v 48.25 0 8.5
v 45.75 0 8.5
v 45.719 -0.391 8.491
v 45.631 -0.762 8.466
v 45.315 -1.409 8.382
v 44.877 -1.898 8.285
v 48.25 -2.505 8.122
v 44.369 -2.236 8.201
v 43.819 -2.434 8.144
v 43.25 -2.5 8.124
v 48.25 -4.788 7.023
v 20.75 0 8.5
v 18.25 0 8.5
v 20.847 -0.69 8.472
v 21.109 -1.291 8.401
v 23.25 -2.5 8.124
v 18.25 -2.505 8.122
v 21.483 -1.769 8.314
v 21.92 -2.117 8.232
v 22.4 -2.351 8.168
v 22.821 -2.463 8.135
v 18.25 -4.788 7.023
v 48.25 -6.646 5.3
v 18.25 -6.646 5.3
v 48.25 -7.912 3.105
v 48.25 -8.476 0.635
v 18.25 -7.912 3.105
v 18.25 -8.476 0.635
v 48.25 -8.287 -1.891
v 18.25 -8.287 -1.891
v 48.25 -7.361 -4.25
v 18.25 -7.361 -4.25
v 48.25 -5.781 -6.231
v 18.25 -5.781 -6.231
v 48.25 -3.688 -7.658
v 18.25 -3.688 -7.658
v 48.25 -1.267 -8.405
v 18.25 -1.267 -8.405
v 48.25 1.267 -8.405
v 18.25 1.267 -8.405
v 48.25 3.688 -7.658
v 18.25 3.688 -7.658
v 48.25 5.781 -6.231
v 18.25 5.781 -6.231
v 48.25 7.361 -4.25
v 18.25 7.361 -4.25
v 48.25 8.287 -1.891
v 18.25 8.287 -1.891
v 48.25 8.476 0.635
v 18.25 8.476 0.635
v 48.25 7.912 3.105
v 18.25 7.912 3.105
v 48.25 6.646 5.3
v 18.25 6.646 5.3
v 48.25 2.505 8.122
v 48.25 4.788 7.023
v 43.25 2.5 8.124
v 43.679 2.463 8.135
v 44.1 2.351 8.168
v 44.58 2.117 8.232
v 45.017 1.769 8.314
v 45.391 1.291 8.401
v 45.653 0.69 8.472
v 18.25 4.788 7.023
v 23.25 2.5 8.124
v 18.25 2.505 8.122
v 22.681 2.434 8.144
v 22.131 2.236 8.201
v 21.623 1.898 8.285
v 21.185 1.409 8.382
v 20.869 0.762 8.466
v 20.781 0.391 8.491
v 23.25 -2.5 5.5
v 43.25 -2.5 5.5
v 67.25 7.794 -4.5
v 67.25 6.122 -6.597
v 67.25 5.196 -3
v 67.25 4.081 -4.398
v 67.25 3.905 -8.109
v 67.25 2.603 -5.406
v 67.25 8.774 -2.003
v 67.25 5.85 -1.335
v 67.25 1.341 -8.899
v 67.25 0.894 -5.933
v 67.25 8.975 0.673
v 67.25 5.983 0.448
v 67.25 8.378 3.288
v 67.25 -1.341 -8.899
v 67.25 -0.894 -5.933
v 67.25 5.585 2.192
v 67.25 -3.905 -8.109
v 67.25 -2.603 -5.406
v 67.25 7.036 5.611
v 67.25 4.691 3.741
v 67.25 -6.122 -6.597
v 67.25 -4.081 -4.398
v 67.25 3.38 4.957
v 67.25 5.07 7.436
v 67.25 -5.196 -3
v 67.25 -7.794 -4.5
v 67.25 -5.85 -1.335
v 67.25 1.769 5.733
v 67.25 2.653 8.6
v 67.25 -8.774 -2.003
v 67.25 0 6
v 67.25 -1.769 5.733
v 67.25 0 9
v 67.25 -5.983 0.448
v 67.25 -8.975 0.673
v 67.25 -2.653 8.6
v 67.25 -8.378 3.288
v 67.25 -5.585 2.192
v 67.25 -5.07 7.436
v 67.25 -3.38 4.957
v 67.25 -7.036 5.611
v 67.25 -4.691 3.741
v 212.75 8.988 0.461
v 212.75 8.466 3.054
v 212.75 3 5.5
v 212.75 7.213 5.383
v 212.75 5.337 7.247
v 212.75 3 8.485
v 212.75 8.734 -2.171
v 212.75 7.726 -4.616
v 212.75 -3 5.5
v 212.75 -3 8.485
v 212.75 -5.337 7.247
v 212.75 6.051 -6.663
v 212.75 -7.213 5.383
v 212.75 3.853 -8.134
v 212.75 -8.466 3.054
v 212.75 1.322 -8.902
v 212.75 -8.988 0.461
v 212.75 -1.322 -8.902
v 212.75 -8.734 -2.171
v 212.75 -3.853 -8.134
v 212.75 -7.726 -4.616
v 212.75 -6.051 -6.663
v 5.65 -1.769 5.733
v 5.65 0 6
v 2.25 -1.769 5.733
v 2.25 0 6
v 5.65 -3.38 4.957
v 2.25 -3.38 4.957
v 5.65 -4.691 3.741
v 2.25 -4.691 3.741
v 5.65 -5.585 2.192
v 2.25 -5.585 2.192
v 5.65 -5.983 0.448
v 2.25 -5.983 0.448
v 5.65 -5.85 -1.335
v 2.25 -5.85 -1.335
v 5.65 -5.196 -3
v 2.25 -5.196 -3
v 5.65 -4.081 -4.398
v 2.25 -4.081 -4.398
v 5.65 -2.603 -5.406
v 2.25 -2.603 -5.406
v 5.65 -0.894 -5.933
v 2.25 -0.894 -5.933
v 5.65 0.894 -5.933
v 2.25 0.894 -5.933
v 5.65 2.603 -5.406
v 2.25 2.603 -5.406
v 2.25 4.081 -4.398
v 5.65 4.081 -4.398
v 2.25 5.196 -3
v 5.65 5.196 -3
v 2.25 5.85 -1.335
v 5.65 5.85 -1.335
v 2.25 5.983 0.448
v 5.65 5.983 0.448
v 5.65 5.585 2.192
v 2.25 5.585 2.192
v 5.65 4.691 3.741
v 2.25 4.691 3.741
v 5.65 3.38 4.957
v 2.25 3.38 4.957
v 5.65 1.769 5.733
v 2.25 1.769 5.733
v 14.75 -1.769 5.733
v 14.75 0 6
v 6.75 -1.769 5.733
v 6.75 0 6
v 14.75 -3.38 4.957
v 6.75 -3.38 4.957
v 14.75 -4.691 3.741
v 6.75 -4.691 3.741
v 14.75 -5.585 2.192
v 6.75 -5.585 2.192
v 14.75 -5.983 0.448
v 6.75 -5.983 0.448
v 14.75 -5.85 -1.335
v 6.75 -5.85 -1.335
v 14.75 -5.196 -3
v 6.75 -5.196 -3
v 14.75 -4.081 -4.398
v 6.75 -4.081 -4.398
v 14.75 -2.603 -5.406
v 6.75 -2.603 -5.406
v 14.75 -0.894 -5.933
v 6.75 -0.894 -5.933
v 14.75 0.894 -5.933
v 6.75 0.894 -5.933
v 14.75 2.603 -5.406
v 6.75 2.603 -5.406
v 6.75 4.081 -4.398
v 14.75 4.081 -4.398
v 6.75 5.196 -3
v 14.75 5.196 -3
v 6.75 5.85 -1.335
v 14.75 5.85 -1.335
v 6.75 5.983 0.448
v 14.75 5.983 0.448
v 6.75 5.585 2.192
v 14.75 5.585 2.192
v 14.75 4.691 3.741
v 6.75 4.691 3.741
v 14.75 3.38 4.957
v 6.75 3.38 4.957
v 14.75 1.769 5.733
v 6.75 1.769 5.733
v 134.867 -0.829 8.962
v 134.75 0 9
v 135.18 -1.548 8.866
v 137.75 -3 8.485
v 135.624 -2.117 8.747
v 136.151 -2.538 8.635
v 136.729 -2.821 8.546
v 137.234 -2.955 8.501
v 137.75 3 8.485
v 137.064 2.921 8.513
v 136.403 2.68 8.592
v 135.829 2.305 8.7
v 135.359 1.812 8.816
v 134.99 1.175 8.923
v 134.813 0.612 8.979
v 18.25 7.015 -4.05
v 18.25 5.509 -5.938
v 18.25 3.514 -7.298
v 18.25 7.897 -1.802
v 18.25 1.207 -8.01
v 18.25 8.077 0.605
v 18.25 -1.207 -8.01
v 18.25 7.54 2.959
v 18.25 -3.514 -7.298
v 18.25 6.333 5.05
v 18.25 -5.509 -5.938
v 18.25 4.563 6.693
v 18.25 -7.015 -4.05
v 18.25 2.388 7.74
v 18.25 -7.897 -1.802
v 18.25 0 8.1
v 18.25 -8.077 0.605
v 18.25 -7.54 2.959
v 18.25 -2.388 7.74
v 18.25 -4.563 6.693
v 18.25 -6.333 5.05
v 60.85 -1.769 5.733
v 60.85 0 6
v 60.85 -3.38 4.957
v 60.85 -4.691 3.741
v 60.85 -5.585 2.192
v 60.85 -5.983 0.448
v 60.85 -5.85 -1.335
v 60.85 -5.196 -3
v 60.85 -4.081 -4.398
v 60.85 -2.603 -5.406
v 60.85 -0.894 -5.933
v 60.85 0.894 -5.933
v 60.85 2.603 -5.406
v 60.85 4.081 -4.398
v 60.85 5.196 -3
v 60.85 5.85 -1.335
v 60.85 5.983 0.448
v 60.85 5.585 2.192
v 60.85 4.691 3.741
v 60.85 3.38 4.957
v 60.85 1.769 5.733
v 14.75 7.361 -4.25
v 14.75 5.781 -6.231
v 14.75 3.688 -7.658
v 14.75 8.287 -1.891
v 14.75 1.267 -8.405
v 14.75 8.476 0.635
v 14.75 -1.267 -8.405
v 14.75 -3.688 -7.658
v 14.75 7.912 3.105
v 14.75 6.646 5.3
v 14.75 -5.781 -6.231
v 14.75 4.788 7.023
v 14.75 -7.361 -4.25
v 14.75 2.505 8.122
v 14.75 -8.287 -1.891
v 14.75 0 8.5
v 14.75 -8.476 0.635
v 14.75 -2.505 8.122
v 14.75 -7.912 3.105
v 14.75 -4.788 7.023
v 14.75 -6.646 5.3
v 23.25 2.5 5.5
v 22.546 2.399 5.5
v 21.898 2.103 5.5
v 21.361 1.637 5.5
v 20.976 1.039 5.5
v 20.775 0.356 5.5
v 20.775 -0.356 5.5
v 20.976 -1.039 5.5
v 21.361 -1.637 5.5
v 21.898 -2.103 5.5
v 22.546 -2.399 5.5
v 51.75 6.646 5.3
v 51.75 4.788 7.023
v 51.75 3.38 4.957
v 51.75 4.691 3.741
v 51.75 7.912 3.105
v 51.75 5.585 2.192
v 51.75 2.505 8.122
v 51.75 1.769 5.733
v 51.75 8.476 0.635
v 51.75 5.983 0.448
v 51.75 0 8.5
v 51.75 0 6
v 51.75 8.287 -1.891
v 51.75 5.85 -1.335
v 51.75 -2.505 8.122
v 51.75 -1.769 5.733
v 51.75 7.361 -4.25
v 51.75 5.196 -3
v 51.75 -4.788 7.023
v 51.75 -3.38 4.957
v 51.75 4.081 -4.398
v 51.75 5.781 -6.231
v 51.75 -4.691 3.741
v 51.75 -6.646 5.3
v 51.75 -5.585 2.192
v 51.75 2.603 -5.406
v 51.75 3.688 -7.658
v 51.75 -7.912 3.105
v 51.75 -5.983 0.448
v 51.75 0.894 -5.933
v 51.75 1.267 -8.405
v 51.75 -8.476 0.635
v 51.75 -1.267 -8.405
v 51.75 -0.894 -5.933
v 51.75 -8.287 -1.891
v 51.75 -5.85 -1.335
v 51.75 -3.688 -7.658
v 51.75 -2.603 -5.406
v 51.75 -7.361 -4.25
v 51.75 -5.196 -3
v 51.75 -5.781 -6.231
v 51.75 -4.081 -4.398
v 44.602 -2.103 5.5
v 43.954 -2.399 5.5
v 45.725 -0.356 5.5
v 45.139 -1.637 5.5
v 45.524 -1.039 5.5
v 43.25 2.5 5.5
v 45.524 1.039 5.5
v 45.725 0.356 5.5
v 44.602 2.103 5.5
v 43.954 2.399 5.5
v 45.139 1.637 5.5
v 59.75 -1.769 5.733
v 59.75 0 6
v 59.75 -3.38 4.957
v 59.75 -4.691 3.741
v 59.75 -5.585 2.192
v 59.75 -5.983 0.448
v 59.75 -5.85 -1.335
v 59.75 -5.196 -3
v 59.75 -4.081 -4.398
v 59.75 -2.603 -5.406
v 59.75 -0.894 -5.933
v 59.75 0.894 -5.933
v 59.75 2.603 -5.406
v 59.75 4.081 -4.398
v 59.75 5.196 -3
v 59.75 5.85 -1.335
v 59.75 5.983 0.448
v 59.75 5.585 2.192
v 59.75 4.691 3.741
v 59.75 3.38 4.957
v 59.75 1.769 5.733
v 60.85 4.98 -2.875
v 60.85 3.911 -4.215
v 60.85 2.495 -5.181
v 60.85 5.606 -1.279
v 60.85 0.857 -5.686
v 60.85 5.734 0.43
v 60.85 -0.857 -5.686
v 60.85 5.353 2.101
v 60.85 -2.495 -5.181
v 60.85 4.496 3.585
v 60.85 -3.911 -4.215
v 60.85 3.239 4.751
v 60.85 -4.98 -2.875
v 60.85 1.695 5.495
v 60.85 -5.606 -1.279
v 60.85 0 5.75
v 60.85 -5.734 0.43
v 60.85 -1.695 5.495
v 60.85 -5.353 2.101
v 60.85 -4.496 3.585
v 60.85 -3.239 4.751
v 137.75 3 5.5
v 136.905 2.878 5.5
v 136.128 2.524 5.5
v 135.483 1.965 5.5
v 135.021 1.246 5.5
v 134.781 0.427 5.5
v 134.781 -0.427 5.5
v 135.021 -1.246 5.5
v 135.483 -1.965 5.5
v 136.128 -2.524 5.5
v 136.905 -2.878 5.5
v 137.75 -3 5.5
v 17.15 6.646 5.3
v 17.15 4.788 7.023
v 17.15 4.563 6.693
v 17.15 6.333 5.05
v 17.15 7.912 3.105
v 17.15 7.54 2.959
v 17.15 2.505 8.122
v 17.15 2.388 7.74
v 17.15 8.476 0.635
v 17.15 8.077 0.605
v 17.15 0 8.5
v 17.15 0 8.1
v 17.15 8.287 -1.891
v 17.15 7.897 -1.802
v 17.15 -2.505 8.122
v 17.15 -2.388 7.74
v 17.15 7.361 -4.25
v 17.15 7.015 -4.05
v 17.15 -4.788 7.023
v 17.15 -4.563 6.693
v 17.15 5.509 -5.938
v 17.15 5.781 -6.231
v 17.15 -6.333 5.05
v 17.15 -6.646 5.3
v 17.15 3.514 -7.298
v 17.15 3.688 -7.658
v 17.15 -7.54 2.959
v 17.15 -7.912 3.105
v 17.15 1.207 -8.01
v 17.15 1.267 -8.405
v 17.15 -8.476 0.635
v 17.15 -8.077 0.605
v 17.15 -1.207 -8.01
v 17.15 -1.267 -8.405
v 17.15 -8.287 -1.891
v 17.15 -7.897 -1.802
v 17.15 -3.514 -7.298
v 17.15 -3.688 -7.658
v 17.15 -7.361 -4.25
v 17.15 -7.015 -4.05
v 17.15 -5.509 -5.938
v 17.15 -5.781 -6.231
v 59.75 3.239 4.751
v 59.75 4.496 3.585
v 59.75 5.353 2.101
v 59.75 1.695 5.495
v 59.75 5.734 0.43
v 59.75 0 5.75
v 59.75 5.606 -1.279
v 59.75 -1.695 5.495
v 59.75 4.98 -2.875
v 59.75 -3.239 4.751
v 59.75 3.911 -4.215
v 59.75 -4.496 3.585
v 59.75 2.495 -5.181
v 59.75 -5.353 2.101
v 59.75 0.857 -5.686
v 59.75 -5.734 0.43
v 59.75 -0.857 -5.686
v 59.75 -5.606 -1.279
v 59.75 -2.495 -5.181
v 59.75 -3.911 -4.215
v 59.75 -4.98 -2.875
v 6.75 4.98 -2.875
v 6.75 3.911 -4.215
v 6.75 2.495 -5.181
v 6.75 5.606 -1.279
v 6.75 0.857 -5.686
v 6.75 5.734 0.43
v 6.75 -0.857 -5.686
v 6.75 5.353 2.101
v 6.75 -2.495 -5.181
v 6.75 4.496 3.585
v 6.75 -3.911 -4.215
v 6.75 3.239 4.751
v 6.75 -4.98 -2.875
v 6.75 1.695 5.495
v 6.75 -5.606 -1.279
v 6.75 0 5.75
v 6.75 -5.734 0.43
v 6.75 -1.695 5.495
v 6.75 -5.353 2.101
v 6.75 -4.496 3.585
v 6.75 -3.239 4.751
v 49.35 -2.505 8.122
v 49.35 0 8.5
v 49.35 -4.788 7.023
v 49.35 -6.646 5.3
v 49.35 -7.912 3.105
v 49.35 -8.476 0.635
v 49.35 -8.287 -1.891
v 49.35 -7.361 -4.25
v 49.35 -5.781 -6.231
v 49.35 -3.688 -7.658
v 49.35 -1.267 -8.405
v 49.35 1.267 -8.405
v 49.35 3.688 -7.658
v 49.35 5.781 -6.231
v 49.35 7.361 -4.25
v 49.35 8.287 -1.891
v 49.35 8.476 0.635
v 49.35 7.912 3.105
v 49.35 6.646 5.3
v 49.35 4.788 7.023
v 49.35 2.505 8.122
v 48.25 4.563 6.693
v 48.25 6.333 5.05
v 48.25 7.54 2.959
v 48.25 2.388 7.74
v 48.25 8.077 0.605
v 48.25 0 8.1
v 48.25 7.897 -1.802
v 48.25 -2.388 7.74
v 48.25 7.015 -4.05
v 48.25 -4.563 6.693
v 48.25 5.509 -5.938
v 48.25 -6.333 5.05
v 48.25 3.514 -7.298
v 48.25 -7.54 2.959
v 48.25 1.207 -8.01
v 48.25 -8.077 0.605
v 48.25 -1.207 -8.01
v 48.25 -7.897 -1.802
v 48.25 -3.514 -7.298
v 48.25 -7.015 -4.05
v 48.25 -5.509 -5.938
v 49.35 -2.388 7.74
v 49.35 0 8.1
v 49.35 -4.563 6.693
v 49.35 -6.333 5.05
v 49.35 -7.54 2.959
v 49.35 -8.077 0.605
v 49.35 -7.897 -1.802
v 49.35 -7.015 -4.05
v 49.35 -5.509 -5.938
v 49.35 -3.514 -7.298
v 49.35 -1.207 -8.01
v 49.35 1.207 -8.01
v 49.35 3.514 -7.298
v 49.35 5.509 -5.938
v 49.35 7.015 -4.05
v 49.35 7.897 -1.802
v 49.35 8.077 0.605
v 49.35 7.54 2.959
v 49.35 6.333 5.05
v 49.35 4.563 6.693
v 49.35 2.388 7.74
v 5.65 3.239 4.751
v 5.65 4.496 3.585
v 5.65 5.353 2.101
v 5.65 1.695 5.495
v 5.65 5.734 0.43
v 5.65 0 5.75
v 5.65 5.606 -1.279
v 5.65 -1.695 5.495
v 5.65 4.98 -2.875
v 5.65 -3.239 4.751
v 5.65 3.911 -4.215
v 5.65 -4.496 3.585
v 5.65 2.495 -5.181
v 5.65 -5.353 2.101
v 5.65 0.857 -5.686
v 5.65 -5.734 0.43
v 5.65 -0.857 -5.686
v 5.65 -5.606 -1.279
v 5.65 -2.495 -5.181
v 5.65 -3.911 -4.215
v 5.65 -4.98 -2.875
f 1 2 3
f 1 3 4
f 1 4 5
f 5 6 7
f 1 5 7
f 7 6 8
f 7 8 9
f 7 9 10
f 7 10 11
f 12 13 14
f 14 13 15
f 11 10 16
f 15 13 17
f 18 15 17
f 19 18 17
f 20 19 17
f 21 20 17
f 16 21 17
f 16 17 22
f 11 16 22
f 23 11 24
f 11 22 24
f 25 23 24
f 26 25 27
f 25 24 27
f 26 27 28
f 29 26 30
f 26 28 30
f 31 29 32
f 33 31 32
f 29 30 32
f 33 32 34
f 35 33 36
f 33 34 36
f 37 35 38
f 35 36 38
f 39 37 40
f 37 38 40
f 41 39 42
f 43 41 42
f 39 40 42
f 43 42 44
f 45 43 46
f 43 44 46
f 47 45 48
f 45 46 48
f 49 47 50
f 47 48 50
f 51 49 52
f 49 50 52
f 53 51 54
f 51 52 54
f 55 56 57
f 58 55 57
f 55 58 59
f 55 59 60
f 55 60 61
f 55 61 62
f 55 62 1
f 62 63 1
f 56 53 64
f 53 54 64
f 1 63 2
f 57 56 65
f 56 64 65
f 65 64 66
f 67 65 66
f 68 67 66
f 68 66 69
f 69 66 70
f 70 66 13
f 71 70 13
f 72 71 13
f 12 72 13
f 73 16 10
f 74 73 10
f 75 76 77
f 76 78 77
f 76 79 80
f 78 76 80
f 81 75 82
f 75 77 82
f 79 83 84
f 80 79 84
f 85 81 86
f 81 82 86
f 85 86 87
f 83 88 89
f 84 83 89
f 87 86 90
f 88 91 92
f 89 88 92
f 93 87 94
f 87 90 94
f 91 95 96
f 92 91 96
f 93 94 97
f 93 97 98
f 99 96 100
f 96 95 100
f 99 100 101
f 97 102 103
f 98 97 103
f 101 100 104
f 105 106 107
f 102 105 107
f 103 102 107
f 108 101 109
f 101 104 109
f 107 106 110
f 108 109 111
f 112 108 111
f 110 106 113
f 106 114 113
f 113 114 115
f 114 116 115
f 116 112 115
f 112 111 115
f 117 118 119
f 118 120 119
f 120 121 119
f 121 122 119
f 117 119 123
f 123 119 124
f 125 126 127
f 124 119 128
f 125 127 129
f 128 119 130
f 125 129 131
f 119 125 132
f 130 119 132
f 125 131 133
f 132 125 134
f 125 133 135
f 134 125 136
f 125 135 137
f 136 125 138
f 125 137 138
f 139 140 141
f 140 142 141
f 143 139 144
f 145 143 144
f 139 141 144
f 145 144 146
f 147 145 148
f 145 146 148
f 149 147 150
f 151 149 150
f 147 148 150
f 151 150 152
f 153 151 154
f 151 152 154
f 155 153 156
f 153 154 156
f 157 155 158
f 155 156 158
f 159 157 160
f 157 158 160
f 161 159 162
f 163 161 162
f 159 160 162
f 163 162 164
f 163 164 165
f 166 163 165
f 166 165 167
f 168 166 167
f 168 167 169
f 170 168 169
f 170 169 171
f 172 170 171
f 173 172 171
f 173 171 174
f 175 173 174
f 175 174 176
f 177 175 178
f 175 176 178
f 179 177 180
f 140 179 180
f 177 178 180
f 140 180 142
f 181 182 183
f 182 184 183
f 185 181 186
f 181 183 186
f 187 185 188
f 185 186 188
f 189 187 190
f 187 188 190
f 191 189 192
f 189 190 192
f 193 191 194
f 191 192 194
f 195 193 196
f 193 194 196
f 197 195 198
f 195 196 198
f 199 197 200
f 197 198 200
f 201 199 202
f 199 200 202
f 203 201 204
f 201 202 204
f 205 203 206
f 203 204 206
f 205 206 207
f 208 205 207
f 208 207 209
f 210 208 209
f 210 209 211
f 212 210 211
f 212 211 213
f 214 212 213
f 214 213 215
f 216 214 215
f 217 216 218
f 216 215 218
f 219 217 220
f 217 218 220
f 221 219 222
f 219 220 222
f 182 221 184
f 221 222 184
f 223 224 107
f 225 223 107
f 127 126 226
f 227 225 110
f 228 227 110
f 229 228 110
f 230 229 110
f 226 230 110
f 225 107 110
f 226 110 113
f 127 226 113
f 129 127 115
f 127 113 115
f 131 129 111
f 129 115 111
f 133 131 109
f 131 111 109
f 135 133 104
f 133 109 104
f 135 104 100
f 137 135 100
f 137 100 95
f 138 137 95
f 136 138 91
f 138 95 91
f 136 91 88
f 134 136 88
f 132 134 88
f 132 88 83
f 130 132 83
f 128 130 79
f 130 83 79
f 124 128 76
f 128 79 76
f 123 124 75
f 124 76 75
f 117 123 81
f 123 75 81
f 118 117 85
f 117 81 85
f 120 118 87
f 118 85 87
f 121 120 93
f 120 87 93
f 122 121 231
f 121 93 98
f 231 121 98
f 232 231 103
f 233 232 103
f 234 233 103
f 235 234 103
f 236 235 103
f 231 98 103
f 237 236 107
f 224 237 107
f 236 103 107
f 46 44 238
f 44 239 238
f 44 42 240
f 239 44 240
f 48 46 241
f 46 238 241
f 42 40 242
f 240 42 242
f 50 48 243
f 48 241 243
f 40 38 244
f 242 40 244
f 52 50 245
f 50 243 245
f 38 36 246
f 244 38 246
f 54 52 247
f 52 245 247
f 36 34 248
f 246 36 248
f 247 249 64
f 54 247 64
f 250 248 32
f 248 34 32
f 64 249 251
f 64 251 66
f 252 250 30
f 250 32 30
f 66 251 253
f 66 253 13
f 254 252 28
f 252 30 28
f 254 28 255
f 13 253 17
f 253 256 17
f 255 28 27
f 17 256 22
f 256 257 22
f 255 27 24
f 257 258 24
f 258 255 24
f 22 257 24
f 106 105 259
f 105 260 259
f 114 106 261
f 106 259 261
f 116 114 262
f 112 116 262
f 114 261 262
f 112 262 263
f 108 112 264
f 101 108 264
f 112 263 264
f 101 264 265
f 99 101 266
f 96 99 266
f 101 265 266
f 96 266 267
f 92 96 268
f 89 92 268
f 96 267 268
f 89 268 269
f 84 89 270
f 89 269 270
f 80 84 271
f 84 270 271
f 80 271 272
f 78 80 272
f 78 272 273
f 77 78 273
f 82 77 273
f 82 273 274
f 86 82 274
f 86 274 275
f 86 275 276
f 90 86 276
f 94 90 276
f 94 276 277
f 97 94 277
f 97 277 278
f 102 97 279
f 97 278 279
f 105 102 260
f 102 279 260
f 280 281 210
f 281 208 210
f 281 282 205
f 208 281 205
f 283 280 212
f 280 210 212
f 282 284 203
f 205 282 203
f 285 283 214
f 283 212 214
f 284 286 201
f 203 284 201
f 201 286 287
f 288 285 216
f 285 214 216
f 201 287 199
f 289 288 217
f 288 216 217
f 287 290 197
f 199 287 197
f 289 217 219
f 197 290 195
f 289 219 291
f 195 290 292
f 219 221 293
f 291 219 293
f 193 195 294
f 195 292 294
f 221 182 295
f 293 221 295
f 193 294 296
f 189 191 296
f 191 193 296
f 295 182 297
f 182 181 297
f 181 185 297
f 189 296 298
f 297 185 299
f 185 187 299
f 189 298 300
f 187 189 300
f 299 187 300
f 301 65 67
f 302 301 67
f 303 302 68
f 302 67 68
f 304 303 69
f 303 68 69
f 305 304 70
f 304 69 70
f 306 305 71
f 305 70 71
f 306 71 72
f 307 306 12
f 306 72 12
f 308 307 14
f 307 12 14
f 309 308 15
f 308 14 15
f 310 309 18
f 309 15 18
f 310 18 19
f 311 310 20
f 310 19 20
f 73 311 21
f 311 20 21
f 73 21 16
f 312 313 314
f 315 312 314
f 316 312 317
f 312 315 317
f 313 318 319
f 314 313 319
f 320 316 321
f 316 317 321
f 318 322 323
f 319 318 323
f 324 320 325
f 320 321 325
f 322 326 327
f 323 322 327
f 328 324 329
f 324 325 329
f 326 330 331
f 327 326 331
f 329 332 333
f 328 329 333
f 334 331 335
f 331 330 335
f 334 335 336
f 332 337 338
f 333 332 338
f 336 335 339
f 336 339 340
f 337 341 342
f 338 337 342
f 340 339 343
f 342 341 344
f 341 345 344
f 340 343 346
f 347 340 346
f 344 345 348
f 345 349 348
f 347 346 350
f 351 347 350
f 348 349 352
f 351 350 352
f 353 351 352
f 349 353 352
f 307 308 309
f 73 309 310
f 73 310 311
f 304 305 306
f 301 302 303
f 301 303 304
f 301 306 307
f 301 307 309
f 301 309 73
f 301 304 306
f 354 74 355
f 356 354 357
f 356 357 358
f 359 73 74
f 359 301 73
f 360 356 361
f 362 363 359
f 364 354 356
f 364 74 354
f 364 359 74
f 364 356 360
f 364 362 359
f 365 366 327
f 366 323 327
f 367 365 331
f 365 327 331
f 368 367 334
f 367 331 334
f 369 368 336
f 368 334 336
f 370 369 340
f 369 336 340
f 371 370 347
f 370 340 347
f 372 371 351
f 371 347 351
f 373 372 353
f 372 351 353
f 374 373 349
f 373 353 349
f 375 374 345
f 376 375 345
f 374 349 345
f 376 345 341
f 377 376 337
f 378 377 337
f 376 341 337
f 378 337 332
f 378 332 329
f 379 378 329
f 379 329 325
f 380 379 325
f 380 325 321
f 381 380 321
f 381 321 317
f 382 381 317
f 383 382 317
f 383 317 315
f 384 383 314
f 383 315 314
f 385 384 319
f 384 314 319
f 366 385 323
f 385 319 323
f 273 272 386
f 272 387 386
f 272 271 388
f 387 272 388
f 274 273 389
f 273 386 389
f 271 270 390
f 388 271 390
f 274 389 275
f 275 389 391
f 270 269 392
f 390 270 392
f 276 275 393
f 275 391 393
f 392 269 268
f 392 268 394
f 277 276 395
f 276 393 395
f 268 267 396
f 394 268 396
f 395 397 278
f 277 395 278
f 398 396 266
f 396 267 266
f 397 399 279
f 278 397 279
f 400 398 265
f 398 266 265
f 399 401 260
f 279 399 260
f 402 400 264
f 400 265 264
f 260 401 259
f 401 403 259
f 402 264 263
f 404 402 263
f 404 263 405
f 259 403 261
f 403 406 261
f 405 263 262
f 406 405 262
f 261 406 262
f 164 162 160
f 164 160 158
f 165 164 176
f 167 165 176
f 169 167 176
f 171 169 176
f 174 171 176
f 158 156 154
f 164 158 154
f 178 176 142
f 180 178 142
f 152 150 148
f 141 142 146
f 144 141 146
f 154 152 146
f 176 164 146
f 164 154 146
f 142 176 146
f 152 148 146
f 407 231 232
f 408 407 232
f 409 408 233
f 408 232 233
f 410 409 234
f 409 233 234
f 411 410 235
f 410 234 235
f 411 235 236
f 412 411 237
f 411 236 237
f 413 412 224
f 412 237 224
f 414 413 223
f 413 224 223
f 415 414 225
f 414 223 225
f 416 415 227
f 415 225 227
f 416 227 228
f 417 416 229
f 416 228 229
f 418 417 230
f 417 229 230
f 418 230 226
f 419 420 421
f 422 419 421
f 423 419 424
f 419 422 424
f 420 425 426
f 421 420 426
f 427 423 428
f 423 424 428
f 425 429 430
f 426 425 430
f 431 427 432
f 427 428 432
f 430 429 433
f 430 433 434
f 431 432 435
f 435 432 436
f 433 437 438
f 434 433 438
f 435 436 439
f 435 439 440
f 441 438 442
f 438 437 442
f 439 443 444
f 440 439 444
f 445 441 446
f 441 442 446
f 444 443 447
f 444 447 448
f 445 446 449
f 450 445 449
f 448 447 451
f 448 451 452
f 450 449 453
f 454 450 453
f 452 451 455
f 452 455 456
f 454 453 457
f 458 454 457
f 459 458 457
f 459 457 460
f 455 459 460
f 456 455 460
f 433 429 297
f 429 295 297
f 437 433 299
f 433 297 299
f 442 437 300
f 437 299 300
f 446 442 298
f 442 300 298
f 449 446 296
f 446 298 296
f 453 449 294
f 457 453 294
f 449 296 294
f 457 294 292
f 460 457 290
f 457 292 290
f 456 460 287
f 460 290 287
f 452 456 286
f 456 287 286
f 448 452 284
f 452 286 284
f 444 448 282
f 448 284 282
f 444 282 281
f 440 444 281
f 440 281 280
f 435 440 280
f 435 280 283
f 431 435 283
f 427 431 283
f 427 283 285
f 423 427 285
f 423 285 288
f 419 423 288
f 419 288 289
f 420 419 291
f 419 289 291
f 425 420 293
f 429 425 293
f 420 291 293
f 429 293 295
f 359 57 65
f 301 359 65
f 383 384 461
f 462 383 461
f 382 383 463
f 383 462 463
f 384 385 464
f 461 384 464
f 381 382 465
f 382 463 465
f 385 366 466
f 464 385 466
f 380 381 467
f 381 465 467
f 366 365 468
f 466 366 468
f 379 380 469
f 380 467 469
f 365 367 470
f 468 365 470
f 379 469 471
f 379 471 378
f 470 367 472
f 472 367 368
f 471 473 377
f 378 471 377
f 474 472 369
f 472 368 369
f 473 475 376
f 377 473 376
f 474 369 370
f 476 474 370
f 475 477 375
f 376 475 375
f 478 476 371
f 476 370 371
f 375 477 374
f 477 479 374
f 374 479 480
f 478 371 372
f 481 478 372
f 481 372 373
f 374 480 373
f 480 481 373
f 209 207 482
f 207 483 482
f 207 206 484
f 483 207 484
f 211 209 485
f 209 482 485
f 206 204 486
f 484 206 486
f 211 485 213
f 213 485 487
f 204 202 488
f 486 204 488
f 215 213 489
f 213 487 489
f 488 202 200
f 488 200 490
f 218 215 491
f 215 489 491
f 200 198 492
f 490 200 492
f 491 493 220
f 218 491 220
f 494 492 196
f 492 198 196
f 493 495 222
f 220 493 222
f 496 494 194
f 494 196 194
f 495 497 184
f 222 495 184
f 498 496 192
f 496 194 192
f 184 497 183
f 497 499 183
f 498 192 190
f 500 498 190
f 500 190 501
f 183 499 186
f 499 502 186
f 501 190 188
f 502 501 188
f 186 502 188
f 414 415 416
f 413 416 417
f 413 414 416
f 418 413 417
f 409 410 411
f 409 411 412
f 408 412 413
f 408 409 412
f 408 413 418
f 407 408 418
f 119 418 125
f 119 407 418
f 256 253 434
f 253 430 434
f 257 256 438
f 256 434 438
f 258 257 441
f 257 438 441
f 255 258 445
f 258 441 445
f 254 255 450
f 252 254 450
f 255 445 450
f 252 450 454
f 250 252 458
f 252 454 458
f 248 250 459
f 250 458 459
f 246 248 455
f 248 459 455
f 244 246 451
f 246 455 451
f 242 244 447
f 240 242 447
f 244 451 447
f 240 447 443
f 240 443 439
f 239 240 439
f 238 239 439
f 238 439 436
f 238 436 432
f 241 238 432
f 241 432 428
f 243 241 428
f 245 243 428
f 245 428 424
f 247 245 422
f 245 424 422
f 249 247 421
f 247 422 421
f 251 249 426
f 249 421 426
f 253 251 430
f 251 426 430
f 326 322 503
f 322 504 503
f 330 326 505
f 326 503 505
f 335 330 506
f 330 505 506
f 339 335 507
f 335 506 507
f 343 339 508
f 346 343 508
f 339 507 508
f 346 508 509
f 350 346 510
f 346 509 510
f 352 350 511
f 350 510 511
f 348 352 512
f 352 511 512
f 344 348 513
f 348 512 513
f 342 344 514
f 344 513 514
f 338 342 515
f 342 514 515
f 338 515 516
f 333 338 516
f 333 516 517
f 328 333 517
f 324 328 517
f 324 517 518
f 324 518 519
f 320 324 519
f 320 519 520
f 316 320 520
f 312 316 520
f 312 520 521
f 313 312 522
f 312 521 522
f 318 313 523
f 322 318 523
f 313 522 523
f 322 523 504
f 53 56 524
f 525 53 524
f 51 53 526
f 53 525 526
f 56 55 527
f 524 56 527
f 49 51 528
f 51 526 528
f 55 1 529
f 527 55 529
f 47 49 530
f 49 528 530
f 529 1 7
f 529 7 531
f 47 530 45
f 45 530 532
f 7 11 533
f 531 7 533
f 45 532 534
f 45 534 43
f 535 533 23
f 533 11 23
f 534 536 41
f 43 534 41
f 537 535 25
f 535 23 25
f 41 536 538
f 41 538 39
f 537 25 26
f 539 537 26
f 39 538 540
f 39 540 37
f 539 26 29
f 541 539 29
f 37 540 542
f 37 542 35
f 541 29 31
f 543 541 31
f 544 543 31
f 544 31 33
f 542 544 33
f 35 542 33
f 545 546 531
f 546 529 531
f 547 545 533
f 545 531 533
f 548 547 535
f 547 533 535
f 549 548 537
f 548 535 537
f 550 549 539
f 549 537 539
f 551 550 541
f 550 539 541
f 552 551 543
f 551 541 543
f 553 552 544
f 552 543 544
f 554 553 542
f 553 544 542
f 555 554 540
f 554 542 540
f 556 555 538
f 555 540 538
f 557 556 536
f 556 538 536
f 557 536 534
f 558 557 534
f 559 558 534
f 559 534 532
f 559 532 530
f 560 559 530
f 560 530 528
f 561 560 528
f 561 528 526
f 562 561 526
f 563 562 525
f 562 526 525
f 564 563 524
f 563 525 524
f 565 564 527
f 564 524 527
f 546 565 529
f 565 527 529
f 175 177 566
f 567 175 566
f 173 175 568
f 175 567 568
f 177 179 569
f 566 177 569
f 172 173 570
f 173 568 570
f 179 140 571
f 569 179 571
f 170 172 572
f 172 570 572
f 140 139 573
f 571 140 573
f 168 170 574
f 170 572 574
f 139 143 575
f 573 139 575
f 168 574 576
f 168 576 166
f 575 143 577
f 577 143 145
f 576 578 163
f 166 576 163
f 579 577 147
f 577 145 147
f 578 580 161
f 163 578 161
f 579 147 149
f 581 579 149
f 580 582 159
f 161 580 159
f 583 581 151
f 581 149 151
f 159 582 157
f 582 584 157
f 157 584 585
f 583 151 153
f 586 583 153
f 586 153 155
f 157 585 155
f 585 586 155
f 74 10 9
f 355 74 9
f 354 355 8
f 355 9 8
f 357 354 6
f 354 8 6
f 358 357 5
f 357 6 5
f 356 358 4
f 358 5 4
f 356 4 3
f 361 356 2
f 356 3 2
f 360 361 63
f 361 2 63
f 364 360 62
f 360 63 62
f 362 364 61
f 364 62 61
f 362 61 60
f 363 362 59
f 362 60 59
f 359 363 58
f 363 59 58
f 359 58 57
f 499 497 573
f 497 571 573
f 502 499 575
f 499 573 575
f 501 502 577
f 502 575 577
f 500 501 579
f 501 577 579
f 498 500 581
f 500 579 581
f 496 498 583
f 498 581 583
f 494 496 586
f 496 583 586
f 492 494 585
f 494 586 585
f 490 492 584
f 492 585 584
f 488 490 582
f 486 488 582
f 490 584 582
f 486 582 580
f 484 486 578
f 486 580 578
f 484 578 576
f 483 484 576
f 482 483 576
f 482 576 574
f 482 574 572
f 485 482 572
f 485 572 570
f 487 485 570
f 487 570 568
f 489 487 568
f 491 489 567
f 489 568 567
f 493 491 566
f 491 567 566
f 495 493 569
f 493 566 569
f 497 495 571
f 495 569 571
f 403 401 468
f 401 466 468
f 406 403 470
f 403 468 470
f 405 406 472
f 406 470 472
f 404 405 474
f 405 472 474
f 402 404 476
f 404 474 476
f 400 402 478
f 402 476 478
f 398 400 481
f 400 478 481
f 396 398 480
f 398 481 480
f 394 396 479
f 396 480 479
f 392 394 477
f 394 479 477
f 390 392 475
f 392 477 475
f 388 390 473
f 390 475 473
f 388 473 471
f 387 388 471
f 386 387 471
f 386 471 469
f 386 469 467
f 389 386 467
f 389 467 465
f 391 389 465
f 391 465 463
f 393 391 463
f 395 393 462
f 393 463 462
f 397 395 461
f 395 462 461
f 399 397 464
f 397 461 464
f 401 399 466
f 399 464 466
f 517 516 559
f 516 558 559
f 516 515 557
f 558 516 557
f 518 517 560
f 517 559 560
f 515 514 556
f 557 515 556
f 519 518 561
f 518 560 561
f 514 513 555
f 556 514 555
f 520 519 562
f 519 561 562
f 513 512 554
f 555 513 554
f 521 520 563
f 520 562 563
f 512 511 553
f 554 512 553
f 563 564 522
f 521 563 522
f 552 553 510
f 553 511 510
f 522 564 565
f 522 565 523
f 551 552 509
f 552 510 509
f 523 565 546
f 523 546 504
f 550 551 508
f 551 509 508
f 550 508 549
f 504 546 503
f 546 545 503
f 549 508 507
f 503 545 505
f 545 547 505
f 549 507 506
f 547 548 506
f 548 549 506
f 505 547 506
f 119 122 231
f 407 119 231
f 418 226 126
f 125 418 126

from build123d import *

# Parameters (mm, degrees)
F4_DEPTH = 3
F7_DEPTH = 3.5


with BuildPart() as f1:
    # F0 (on Front) → F1 (revolve)
    with BuildSketch(Plane.XZ):
        Polygon((2.250003, 6), (2.250003, 0), (64.250003, 0), (81.750003, 0), (192.750003, 0), (212.750003, 0), (212.750003, 6), (212.750003, 9), (192.750003, 9), (67.250003, 9), (67.250003, 6), (62.250003, 6), (60.850003, 6), (60.850003, 5.75), (59.750003, 5.75), (59.750003, 6), (51.750003, 6), (51.750003, 8.5), (49.350003, 8.5), (49.350003, 8.1), (48.250003, 8.1), (48.250003, 8.5), (18.250003, 8.5), (18.250003, 8.1), (17.150003, 8.1), (17.150003, 8.5), (14.750003, 8.5), (14.750003, 6), (6.750003, 6), (6.750003, 5.75), (5.650003, 5.75), (5.650003, 6), align=None)
    revolve(axis=Axis((33.250003, 0, 0), (1, 0, 0)))

    # F3 (on offset) → F4 (cut)
    with BuildSketch(Plane.XY.offset(8.5)):
        with BuildLine():
            Line((43.250003, 2.5), (23.250003, 2.5))
            ThreePointArc((23.250003, 2.5), (20.750003, 0), (23.250003, -2.5))
            Line((23.250003, -2.5), (43.250003, -2.5))
            ThreePointArc((43.250003, -2.5), (45.750003, 0), (43.250003, 2.5))
        make_face()
    extrude(amount=-F4_DEPTH, mode=Mode.SUBTRACT)

    # F6 (on offset) → F7 (cut)
    with BuildSketch(Plane.XY.offset(9)):
        with BuildLine():
            Line((212.750003, 3), (137.750003, 3))
            ThreePointArc((137.750003, 3), (134.750003, 0), (137.750003, -3))
            Line((137.750003, -3), (212.750003, -3))
            Line((212.750003, -3), (212.750003, 3))
        make_face()
    extrude(amount=-F7_DEPTH, mode=Mode.SUBTRACT)


solid = f1.part
